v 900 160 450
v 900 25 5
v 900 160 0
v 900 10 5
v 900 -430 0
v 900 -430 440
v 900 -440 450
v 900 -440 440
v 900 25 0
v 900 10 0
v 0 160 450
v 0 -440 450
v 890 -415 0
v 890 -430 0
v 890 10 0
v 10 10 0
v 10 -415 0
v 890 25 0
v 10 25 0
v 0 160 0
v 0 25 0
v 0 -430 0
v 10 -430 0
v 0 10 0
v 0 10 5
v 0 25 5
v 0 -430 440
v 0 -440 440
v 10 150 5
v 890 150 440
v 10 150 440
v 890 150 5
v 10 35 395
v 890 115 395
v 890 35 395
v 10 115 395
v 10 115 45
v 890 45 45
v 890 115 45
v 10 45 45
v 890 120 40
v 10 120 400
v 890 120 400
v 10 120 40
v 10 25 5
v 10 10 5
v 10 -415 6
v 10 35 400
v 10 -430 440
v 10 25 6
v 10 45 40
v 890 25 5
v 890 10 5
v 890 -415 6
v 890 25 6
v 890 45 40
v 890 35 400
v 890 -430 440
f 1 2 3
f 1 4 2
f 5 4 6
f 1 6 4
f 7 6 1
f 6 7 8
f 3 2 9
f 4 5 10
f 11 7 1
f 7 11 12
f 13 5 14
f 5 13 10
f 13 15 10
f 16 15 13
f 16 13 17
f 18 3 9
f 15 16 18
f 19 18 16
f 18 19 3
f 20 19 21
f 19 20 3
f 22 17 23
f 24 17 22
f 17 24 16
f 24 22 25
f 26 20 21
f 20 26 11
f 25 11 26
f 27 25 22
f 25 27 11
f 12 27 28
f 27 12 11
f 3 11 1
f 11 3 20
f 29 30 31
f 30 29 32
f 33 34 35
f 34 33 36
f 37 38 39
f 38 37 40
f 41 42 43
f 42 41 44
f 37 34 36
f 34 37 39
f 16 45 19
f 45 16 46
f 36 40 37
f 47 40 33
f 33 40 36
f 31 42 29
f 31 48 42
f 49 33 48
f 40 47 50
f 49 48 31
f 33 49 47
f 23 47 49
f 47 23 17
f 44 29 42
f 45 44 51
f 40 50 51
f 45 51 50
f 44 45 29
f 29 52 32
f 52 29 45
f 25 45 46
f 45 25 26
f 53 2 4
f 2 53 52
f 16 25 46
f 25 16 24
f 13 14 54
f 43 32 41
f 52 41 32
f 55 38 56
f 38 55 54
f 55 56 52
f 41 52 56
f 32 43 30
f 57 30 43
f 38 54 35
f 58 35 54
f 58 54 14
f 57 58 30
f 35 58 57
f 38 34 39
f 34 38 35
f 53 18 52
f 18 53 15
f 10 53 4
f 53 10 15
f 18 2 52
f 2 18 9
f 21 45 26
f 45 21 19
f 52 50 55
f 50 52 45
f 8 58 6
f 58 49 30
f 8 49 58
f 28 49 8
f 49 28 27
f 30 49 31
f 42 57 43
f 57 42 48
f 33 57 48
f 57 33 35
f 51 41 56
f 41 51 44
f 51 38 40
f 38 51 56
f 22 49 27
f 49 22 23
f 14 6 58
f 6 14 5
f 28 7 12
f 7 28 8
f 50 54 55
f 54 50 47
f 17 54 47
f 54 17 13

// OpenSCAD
 //size in mm
height = 450;
width  = 900;
depth  = 150;

//Computing sizes
ExhaustExtHeight = 50;

//material standard sizes
plasticSize1 = 1;
glassSize1   = 5;
plywoodSize1 = 5;
plywoodSize2 = 10;

//Module Part definition
module BackPanel(){
    cube([
        width,
        plywoodSize2, 
        height
    ]);
}

module Pegboard(){
    cube([
        width - plywoodSize2,
        plywoodSize1,
        height-(ExhaustExtHeight*2)
    ]);
}

module SidePanel(){
    cube([
        plywoodSize2,
        depth-plywoodSize2,
        height-plywoodSize2+plywoodSize1,
    ]);
}

module CellingPanel(){
    cube([
        width,
        depth,
        plywoodSize2
    ]);
}
module FloorPanel(){
    cube([
        width,
        depth-plywoodSize2-plywoodSize2-plywoodSize1,
        plywoodSize1
    ]);
}

module ExhaustInternalPanel(){
    cube([
        width - plywoodSize2,
        depth - ExhaustExtHeight - plywoodSize1 - plywoodSize2,
        plywoodSize1
    ]);
}

module BottomExhaustTopPanel(){
    cube([
        width - plywoodSize2,
        depth - ExhaustExtHeight - plywoodSize2*2 - plywoodSize1,
        plywoodSize1
    ]);
}

module BottonExhaustSupport(){
    cube([
        plywoodSize1,
        depth-ExhaustExtHeight - plywoodSize2,
        ExhaustExtHeight - (plywoodSize1*2)
    ]);
}

module FoldingDoor(){
    cube([
        plywoodSize2,
        width/2-plywoodSize2,
        height-plywoodSize2
    ]);
}

module FoldingCelling(){
    cube([
        width,
        height-plywoodSize2,
        plywoodSize2
    ]);
}

module BottonExhaustCover(){
    cube([
        width-(plywoodSize2*2),
        ExhaustExtHeight,
        plywoodSize1
    ]);
}

module SolderingFloor(){
    cube([
        width-(plywoodSize2*2),
        height-ExhaustExtHeight-plywoodSize2,
        plywoodSize1
    ]);
}

module PaintingFloor(){
    cube([
        width-(plywoodSize2*2),
        height-plywoodSize2,
        plasticSize1
    ]);
}

// ----------------
//  Mounting parts
// ----------------

//Fixed Body
    //Backpanel
translate([0,depth,0])
    BackPanel();

    //Pegboard
translate([plywoodSize1,
    depth - plywoodSize2 - (ExhaustExtHeight/2),
    ExhaustExtHeight - plywoodSize1])
    Pegboard();

    //Right Side Panel
translate([0, 
        plywoodSize2 , 
        plywoodSize1])
    SidePanel();

    //Left Side Panel
translate([width-plywoodSize2, 
            plywoodSize2 , 
            plywoodSize1])
    SidePanel();
    
    // Floor Panel
translate([0, 
        plywoodSize2*2+plywoodSize1,
        0])
    FloorPanel();
    
    // Top Panel
translate([0,0,height-plywoodSize2])
    CellingPanel();

// ------------------
//Internals
    //Top Exhaust Bottom Panel
translate([plywoodSize1,
        plywoodSize2+(ExhaustExtHeight/2),
        height-ExhaustExtHeight-plywoodSize1])
    ExhaustInternalPanel();
    
    //Botton Exhaust Top Panel
translate([plywoodSize1,
        (plywoodSize2*2)+(ExhaustExtHeight/2),
        ExhaustExtHeight-(plywoodSize1*2)])
    BottomExhaustTopPanel();
    
// ------------------
//Folding Parts
translate([0,
        -width/2+(plywoodSize2*2),
        0])
    FoldingDoor();

translate([width-plywoodSize2,
        -width/2+(plywoodSize2*2),
        0])
    FoldingDoor();

translate([0,
        plywoodSize2-height,
        height-plywoodSize2])
    FoldingCelling();
    
//FoldingFloor
    //Soldering floor
translate([plywoodSize2,
        plywoodSize2+ExhaustExtHeight/2-height,
        plasticSize1])
    SolderingFloor();
    
    //Soldering botton exhaust cover
translate([plywoodSize2,
        -ExhaustExtHeight/2,
        plasticSize1])
    BottonExhaustCover();
    
    //Painting floor
rotate(0,0,90)
    translate([plywoodSize2,
            ExhaustExtHeight-plywoodSize2
            -plywoodSize1-height,0])
        PaintingFloor();
